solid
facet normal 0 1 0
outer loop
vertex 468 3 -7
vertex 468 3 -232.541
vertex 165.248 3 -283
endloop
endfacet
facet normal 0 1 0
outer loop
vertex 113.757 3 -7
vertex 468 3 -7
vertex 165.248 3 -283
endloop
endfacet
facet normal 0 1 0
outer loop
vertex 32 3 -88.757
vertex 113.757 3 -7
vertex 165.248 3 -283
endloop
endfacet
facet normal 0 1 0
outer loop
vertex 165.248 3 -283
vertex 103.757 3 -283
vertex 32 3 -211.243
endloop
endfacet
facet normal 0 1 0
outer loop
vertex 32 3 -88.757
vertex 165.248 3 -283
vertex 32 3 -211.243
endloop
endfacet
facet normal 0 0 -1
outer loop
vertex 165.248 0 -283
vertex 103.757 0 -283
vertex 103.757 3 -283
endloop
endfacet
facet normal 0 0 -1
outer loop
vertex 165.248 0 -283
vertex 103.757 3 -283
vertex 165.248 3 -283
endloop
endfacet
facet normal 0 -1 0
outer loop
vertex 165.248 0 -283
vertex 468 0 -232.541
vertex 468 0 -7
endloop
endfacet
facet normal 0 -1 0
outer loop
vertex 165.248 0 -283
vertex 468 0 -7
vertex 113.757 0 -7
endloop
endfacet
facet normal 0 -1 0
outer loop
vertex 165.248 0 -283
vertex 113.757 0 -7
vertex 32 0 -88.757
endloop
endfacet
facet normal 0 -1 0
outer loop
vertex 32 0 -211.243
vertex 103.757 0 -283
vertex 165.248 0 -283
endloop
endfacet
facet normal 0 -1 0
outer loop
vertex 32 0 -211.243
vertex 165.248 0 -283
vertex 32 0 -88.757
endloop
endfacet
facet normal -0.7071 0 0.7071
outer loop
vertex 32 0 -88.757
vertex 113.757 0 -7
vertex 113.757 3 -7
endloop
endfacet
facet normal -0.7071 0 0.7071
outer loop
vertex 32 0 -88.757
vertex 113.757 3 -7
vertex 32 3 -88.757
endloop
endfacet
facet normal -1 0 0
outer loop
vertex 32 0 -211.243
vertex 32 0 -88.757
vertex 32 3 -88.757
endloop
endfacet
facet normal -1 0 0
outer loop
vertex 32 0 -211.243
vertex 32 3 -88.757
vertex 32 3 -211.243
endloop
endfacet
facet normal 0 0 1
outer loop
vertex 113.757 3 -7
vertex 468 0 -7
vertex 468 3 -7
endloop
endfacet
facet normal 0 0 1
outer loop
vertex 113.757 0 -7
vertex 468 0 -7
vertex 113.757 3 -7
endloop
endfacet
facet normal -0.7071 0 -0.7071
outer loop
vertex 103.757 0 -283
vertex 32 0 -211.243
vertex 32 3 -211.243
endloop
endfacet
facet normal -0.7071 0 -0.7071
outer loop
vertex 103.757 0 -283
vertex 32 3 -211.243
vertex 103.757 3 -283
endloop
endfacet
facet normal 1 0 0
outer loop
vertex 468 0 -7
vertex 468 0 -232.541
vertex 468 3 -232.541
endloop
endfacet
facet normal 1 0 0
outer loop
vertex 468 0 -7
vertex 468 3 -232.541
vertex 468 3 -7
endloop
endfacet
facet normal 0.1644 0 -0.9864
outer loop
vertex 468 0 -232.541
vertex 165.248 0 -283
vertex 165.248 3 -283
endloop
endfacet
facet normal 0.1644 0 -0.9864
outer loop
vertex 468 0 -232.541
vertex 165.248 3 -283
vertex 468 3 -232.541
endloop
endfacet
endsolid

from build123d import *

# Parameters (mm, degrees)
BOSS_EXTRU_1_DEPTH = 3


with BuildPart() as part:
    # Esquisse1 → Boss.-Extru.1 (new body)
    # profile 1 of 2: a face of its own
    with BuildSketch(Plane(origin=(0, 0, 0), x_dir=(1, 0, 0), z_dir=(0, 1, 0))):
        Polygon((103.757359313, 283), (165.248287591, 283), (468, 232.541381265), (468, 7), (113.757359313, 7), (32, 88.757359313), (32, 211.242640687), align=None)
        Polygon((105, 280), (165, 280), (465, 230), (465, 10), (115, 10), (35, 90), (35, 210), align=None, mode=Mode.SUBTRACT)
    # profile 2 of 2: a face of its own
    with BuildSketch(Plane(origin=(0, 0, 0), x_dir=(1, 0, 0), z_dir=(0, 1, 0))):
        Polygon((165, 280), (465, 230), (465, 10), (115, 10), (35, 90), (35, 210), (105, 280), align=None)
    extrude(amount=BOSS_EXTRU_1_DEPTH)


solid = part.part
